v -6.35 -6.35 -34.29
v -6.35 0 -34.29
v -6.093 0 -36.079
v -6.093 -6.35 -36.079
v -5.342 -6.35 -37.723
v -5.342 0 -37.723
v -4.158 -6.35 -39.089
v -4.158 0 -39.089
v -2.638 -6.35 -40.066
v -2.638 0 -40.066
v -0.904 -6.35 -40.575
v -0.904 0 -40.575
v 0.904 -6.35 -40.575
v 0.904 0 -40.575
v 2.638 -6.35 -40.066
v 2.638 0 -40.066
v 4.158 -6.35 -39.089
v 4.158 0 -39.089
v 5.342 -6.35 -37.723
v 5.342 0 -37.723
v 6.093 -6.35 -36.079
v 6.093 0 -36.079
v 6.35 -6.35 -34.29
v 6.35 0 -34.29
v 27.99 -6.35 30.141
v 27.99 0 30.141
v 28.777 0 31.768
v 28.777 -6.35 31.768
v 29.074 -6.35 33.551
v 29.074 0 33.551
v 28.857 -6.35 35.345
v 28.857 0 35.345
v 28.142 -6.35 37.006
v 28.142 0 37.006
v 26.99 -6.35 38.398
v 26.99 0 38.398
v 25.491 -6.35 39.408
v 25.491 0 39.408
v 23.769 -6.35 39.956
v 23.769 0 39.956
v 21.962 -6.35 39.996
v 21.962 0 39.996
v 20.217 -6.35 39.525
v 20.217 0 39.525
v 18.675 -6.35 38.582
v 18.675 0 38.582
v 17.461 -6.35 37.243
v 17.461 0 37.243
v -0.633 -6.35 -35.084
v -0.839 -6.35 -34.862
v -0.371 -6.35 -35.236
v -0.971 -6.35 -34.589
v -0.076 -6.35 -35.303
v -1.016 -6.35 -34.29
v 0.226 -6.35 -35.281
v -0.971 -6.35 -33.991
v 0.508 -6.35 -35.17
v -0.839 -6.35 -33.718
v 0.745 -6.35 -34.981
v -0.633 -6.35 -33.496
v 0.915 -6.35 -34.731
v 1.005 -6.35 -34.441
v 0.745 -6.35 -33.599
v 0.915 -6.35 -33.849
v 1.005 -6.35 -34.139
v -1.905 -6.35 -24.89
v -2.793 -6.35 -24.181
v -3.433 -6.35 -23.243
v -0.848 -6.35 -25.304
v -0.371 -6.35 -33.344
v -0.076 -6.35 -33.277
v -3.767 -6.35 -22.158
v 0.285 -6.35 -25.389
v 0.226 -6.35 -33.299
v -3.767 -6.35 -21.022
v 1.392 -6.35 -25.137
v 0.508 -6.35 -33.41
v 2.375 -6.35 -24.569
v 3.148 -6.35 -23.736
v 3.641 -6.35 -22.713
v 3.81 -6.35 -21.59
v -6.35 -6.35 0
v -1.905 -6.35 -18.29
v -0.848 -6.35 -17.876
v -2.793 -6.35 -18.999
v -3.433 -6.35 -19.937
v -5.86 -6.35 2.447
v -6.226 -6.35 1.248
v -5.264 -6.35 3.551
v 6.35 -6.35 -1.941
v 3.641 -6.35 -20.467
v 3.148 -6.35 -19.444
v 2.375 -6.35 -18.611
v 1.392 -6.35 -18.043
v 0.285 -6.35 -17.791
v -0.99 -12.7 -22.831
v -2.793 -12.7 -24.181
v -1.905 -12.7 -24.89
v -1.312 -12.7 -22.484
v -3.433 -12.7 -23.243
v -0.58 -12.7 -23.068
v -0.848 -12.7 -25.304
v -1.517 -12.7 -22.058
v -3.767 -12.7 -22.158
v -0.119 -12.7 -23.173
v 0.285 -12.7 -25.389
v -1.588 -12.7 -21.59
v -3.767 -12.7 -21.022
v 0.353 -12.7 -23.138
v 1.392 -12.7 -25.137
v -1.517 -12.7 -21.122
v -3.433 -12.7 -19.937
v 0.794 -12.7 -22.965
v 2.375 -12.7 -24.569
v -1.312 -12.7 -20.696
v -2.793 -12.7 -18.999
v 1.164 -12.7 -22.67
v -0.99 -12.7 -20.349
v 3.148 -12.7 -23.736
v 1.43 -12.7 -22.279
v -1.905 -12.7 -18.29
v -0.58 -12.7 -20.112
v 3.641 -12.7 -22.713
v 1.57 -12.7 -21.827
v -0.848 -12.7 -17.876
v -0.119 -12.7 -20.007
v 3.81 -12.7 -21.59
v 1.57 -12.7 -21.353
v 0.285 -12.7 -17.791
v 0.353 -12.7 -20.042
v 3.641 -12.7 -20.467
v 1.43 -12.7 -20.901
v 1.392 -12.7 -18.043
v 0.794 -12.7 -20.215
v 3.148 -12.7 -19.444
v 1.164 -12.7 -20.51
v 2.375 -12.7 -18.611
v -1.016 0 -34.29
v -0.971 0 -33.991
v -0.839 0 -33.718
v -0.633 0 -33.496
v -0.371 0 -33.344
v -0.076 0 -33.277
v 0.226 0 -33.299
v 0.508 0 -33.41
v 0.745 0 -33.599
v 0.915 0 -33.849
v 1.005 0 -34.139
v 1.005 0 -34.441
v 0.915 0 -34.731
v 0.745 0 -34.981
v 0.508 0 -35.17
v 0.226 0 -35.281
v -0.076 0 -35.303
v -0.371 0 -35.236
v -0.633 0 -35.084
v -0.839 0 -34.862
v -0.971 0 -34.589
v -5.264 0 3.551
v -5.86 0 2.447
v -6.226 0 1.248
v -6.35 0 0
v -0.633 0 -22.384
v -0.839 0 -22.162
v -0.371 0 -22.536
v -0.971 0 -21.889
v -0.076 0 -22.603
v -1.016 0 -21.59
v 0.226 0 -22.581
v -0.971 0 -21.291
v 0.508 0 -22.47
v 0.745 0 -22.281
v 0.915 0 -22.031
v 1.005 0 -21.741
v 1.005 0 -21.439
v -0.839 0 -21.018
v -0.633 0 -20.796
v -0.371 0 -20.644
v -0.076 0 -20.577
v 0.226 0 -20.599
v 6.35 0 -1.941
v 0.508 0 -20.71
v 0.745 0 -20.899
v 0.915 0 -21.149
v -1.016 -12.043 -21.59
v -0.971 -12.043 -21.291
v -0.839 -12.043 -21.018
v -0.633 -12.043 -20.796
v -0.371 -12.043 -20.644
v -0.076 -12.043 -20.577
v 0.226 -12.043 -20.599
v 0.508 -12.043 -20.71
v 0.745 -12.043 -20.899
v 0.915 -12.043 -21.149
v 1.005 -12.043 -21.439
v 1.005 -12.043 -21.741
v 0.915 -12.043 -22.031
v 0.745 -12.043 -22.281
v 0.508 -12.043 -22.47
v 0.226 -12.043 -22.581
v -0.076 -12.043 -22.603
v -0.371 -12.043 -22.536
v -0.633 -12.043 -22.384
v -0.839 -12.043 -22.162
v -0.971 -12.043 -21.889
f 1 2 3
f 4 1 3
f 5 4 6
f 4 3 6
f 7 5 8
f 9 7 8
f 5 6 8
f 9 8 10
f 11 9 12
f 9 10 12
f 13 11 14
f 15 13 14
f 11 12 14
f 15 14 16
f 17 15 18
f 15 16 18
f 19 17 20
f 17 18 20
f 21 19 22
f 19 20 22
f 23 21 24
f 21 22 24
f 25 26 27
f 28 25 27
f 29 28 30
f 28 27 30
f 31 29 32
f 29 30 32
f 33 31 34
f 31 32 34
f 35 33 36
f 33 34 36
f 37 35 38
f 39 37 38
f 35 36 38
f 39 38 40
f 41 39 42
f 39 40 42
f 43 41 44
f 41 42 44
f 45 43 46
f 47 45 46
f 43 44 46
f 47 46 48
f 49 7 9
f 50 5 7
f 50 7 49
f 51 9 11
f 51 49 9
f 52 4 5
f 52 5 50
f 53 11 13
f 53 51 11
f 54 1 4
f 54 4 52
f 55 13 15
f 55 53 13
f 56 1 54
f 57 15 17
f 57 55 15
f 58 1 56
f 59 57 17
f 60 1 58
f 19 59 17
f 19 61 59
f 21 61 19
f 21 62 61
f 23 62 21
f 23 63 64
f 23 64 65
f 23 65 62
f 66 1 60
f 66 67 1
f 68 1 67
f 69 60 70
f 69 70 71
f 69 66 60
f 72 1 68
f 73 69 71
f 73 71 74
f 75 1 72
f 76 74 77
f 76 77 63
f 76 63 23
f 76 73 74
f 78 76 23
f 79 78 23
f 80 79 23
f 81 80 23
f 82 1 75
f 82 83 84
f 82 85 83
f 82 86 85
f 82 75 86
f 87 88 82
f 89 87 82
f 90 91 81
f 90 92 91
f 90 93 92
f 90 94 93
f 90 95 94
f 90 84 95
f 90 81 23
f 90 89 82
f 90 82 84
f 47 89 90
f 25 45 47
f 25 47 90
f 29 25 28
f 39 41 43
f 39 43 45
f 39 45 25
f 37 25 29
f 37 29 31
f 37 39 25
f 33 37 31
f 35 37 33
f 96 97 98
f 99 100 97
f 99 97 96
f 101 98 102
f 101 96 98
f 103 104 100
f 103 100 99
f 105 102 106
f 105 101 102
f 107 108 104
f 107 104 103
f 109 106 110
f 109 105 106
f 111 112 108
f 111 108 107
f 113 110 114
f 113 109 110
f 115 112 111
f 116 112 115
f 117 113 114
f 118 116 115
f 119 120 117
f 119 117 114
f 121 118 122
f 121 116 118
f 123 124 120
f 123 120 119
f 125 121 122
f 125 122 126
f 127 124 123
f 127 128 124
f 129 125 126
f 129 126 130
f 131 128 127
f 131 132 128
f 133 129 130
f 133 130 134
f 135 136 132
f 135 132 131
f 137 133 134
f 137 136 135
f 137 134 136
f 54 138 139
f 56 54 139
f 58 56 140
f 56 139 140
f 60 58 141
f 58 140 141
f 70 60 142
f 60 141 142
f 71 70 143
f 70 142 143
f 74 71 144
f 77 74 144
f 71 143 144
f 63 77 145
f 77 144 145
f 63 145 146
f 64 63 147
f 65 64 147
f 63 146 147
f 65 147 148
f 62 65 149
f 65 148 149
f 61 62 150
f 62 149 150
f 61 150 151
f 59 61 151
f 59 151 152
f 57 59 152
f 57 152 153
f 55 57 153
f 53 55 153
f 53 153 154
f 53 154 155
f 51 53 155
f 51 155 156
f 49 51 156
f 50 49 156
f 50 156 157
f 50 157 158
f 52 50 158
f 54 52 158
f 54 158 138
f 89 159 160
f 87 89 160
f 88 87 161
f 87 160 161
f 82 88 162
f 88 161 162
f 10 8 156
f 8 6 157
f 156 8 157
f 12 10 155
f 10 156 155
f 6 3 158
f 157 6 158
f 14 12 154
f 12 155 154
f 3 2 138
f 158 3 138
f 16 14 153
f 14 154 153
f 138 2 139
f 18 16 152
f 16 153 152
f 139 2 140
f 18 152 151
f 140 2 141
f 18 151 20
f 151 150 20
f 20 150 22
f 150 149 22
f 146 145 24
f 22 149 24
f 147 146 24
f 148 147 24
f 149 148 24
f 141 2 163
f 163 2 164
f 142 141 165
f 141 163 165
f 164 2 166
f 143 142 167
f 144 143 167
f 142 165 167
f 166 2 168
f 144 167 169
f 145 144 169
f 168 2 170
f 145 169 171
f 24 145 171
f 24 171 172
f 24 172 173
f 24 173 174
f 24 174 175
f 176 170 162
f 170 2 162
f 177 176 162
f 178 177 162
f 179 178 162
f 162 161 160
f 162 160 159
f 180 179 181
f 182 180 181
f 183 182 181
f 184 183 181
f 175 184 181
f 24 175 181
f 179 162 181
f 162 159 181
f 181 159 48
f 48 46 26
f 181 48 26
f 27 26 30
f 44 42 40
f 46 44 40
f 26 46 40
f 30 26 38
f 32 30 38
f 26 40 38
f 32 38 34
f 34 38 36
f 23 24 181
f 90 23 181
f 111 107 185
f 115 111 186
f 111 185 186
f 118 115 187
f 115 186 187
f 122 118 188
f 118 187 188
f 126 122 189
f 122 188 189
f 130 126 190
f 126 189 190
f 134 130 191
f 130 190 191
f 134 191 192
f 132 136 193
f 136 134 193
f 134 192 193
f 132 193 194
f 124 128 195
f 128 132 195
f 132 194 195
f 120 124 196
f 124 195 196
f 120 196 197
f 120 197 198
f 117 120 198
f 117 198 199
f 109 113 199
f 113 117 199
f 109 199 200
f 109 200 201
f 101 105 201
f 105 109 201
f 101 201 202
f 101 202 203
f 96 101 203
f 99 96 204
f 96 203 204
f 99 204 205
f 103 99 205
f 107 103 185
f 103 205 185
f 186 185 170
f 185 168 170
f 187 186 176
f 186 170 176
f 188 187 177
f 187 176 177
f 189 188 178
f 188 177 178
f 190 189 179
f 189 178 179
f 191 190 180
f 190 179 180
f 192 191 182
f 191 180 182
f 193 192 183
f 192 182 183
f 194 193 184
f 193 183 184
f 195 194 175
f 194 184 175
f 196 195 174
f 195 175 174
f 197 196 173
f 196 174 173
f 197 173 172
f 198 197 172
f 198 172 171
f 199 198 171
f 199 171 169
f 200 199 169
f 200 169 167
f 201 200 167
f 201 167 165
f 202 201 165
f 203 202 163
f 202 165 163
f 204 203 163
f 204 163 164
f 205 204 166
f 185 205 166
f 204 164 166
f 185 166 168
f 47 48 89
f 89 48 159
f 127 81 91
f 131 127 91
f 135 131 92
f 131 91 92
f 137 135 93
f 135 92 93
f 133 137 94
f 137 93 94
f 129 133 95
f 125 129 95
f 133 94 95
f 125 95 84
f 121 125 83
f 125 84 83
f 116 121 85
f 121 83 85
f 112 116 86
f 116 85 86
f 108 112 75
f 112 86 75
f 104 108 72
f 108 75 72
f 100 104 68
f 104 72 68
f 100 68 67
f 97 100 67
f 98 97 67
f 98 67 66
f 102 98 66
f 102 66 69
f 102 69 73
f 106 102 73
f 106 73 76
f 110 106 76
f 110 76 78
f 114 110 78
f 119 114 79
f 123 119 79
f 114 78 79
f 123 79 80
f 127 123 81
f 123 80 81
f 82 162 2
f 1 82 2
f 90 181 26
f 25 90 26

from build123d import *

# Parameters (mm, degrees)
F1_DEPTH       = 6.35
F2_R           = 3.81
F3_DEPTH       = 6.35
F5_D           = 2.032
F5_CSINK_D     = 3.175
F5_CSINK_ANGLE = 82
F7_D           = 2.032


with BuildPart() as f1:
    # F0 (on Front) → F1 (new body)
    with BuildSketch(Plane.XZ):
        with BuildLine():
            Line((3.550874937, 5.2643885857), (0, 0))
            Line((0, 0), (0, -6.35))
            ThreePointArc((0, -6.35), (2.9811444237, -5.6067172147), (5.2643885857, -3.550874937))
            Line((5.2643885857, -3.550874937), (6.35, -1.9413898273))
            Line((6.35, -1.9413898273), (6.35, 0))
            ThreePointArc((6.35, 0), (5.6067172147, 2.9811444237), (3.550874937, 5.2643885857))
        make_face()
        with BuildLine():
            Line((0, -6.35), (0, 0))
            Line((0, 0), (3.550874937, 5.2643885857))
            ThreePointArc((3.550874937, 5.2643885857), (-1.2116371206, 6.2333326149), (-5.2643885857, 3.550874937))
            ThreePointArc((-5.2643885857, 3.550874937), (-6.0725352004, 1.856560325), (-6.35, 0))
            ThreePointArc((-6.35, 0), (-4.4901280605, -4.4901280605), (0, -6.35))
        make_face()
        with BuildLine():
            ThreePointArc((5.2643885857, -3.550874937), (2.9811444237, -5.6067172147), (0, -6.35))
            Line((0, -6.35), (0, -15.24))
            ThreePointArc((0, -15.24), (4.4901280605, -17.0998719395), (6.35, -21.59))
            Line((6.35, -21.59), (6.35, -1.9413898273))
            Line((6.35, -1.9413898273), (5.2643885857, -3.550874937))
        make_face()
        with BuildLine():
            Line((0, -15.24), (0, -6.35))
            ThreePointArc((0, -6.35), (-4.4901280605, -4.4901280605), (-6.35, 0))
            Line((-6.35, 0), (-6.35, -21.59))
            ThreePointArc((-6.35, -21.59), (-4.4901280605, -17.0998719395), (0, -15.24))
        make_face()
        with BuildLine():
            ThreePointArc((-5.2643885857, 3.550874937), (-1.2116371206, 6.2333326149), (3.550874937, 5.2643885857))
            ThreePointArc((3.550874937, 5.2643885857), (5.6067172147, 2.9811444237), (6.35, 0))
            Line((6.35, 0), (6.35, -1.9413898273))
            Line((6.35, -1.9413898273), (27.9899881828, 30.1412120116))
            ThreePointArc((27.9899881828, 30.1412120116), (26.2764745341, 38.9564755344), (17.4612110113, 37.2429618857))
            Line((17.4612110113, 37.2429618857), (-5.2643885857, 3.550874937))
        make_face()
        with BuildLine():
            ThreePointArc((6.35, -21.59), (4.4901280605, -17.0998719395), (0, -15.24))
            Line((0, -15.24), (0, -21.59))
            Line((0, -21.59), (0, -27.94))
            ThreePointArc((0, -27.94), (4.4901280605, -26.0801280605), (6.35, -21.59))
        make_face()
        with BuildLine():
            Line((0, -21.59), (0, -15.24))
            ThreePointArc((0, -15.24), (-4.4901280605, -17.0998719395), (-6.35, -21.59))
            ThreePointArc((-6.35, -21.59), (-4.4901280605, -26.0801280605), (0, -27.94))
            Line((0, -27.94), (0, -21.59))
        make_face()
        with BuildLine():
            ThreePointArc((0, -27.94), (-4.4901280605, -26.0801280605), (-6.35, -21.59))
            Line((-6.35, -21.59), (-6.35, -34.29))
            ThreePointArc((-6.35, -34.29), (0, -40.64), (6.35, -34.29))
            Line((6.35, -34.29), (6.35, -21.59))
            ThreePointArc((6.35, -21.59), (4.4901280605, -26.0801280605), (0, -27.94))
        make_face()
    extrude(amount=F1_DEPTH)

    # F2 (on face) → F3 (join)
    with BuildSketch(Plane.XZ.offset(6.35)):
        with Locations((0, -21.59)):
            Circle(F2_R)
    extrude(amount=F3_DEPTH)

    # F5 (through all)
    with Locations(Plane.XZ.offset(12.7)):
        with Locations((0, -21.59)):
            CounterSinkHole(F5_D / 2, F5_CSINK_D / 2, counter_sink_angle=F5_CSINK_ANGLE)

    # F7 (through all)
    with Locations(Plane.XZ.offset(6.35)):
        with Locations((0, -34.29)):
            Hole(F7_D / 2)


solid = f1.part
